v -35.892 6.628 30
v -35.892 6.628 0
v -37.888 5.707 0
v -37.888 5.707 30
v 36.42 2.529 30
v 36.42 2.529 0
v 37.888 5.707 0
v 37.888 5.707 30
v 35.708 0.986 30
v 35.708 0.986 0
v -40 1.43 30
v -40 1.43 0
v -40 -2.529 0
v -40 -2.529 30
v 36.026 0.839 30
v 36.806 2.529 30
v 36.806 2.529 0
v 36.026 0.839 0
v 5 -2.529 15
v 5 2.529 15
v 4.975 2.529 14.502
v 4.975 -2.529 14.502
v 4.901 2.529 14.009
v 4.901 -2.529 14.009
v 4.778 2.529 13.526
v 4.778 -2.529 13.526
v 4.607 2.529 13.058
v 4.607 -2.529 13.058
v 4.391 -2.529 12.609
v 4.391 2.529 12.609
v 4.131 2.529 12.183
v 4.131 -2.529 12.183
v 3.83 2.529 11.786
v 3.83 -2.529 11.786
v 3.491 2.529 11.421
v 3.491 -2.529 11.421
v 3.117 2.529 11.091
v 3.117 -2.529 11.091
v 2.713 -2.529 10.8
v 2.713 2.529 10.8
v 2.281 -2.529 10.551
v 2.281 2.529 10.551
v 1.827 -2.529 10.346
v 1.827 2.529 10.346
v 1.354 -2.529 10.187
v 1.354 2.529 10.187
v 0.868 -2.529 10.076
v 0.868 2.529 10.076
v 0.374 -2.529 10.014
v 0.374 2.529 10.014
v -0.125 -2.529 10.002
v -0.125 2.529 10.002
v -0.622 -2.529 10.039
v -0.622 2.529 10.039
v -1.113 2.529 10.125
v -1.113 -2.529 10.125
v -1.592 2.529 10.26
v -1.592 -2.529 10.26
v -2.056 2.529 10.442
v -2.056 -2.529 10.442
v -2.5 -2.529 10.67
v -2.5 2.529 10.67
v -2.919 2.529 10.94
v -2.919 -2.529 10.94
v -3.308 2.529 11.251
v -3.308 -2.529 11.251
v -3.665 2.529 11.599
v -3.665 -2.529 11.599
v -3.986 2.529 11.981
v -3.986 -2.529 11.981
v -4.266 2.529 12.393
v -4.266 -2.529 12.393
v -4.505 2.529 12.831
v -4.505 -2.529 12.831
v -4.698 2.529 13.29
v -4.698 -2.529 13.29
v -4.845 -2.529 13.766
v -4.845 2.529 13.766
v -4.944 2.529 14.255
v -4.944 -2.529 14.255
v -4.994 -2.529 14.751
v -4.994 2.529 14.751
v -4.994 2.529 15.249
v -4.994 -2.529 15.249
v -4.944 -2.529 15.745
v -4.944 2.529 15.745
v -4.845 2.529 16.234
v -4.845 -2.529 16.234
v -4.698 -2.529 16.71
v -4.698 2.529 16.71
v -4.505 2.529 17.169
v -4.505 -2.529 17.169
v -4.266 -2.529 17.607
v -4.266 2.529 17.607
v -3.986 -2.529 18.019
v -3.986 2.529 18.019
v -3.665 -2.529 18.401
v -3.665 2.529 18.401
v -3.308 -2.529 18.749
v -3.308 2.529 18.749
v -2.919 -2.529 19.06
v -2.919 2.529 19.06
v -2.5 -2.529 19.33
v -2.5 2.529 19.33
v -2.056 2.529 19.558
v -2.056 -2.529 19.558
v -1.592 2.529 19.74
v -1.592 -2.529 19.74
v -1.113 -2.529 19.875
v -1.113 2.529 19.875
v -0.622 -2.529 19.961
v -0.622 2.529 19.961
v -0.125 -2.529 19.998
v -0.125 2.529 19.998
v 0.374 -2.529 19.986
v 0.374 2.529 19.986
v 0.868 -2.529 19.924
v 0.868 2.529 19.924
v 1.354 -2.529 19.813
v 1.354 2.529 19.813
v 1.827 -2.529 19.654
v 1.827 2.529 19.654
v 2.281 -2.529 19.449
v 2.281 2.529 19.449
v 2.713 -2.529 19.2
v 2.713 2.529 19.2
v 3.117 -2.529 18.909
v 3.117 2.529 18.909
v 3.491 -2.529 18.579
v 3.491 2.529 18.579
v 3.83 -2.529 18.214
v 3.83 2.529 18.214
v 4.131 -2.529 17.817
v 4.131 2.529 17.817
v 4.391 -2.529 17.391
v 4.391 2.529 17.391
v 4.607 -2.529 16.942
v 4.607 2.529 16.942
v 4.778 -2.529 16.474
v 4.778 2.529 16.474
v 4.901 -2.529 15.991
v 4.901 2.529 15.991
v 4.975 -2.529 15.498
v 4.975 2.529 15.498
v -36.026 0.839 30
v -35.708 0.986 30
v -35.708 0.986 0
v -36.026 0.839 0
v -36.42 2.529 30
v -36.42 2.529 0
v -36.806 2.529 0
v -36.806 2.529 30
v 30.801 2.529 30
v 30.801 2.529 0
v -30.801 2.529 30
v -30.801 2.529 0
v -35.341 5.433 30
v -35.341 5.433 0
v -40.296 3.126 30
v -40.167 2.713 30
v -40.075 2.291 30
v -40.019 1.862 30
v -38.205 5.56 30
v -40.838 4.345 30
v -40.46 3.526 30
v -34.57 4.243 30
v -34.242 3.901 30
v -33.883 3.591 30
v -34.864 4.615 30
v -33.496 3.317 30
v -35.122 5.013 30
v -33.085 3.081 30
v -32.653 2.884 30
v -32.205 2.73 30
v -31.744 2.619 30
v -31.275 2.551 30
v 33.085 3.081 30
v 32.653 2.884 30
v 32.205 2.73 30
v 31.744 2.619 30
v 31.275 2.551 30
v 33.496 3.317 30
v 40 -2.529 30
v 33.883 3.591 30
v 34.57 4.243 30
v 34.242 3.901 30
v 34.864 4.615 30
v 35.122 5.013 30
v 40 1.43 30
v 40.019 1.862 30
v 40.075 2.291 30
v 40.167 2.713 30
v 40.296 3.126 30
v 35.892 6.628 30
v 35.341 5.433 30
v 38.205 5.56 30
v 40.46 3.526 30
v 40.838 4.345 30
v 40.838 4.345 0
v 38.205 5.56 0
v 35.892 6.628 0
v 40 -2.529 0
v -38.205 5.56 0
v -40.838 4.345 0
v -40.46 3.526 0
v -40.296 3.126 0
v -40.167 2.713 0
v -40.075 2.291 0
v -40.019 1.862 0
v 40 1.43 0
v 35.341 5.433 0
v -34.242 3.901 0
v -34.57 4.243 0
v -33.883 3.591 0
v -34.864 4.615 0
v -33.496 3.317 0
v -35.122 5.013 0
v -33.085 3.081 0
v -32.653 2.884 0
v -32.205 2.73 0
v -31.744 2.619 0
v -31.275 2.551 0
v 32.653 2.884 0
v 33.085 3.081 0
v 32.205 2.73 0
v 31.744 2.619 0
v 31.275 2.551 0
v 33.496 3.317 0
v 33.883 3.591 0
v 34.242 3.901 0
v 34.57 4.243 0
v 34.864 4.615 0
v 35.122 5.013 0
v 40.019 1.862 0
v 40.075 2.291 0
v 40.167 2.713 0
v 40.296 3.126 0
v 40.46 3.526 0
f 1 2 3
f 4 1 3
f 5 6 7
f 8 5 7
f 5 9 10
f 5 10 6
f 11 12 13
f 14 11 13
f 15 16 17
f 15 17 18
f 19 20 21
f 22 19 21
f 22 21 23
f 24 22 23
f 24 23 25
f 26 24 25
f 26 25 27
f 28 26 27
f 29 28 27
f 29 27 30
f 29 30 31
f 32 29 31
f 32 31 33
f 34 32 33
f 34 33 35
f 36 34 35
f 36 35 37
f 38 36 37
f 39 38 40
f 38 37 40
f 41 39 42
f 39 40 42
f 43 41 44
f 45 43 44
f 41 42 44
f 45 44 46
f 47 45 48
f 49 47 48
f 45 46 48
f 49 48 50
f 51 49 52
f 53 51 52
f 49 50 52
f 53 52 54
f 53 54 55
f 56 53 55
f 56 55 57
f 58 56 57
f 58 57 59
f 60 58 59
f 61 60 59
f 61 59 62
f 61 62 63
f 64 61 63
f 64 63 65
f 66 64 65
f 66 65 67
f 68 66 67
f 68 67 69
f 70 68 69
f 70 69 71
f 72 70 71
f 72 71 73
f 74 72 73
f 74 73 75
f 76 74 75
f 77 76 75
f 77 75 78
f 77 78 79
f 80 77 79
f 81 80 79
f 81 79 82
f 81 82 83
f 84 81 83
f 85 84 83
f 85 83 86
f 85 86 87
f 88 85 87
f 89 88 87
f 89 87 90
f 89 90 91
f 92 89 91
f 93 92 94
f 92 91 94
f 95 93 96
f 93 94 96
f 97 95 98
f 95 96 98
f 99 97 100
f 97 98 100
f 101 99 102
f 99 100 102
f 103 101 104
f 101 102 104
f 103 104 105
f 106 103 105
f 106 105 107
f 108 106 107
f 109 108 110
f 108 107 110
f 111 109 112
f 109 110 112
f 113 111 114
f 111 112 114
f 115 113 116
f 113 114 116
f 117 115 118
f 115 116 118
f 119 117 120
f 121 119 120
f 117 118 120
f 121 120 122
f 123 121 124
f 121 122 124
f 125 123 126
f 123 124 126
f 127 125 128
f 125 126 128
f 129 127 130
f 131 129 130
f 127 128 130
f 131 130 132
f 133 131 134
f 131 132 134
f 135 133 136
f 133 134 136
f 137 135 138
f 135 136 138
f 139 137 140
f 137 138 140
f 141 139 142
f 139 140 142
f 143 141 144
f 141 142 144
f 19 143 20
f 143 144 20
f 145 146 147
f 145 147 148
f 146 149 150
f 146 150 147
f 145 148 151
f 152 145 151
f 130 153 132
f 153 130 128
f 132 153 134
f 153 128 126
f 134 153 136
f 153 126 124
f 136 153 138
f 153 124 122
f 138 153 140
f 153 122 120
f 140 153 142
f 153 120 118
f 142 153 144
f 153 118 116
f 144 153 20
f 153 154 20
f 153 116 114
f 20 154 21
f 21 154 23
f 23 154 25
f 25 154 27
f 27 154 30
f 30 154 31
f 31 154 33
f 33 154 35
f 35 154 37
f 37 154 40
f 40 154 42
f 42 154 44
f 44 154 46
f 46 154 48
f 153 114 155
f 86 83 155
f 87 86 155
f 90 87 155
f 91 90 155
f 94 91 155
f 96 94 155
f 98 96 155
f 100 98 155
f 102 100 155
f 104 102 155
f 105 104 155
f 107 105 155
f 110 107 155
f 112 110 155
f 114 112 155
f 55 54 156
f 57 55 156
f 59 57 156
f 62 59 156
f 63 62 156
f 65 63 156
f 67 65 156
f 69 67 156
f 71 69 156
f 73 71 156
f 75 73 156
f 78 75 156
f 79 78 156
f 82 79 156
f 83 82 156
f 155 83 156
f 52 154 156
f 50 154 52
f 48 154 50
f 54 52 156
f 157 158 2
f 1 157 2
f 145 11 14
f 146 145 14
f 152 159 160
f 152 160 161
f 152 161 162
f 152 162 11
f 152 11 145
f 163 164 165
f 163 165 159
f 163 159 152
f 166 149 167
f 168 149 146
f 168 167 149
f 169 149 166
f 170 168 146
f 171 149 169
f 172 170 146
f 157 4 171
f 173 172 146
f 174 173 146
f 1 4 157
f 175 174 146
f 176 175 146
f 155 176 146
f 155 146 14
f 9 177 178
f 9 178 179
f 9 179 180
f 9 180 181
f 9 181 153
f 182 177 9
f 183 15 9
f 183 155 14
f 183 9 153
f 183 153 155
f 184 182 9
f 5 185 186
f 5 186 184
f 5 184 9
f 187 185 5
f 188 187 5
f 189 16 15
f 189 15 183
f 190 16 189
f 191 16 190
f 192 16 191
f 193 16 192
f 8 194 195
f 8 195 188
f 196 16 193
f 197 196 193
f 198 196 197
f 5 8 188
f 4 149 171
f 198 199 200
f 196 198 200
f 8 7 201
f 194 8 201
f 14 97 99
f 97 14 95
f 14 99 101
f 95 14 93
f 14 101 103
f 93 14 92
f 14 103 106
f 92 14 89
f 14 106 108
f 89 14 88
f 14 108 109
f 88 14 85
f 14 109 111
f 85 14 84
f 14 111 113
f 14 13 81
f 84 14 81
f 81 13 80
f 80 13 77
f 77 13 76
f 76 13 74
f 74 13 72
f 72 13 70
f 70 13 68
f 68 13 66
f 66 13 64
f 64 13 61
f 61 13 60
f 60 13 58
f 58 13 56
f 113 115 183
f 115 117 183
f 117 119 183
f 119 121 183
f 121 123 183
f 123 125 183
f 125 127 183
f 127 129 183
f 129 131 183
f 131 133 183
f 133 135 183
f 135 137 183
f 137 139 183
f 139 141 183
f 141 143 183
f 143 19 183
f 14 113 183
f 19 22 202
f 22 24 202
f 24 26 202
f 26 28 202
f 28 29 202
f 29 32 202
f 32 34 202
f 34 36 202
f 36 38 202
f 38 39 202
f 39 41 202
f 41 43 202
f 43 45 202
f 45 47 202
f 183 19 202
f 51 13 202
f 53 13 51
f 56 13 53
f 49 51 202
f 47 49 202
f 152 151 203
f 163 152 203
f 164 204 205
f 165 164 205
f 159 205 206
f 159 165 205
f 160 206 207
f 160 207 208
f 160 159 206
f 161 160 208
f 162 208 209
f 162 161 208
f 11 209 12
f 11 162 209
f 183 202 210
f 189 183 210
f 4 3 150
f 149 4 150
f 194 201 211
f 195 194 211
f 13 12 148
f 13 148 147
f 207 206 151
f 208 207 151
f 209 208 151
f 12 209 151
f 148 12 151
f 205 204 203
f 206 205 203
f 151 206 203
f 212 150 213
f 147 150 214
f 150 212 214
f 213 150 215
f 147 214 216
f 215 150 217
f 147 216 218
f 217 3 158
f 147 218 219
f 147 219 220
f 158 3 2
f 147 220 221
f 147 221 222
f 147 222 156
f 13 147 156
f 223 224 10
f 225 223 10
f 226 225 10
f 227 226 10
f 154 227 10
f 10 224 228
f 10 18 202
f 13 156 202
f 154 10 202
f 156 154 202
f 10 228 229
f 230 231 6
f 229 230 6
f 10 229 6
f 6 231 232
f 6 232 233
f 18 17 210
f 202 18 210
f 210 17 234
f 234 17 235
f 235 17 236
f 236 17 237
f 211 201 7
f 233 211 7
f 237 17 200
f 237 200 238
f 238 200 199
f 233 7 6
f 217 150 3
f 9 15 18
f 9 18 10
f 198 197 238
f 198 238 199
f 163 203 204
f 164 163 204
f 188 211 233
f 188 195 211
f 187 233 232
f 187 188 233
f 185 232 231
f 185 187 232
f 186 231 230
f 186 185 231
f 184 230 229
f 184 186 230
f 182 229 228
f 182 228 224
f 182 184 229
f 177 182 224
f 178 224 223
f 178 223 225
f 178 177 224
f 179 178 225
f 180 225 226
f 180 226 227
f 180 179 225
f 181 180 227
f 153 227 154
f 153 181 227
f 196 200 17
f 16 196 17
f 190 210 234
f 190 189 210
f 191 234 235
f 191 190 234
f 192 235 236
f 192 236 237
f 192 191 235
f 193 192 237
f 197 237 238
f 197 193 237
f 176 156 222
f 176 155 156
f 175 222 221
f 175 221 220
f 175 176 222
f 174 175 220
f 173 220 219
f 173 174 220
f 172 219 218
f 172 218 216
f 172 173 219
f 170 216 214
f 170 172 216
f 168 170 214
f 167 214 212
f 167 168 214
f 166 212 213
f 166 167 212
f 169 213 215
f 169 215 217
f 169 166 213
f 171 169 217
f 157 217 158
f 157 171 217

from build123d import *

# Parameters (mm, degrees)
BOSS_EXTRUDE1_DEPTH = 30
FILLET1_R           = 5
SKETCH2_R           = 5
CUT_EXTRUDE1_DEPTH  = 10


with BuildPart() as part:
    # Sketch1 → Boss-Extrude1 (new body)
    with BuildSketch(Plane.XY):
        Polygon((40, -2.528830443), (40, 2.528830443), (36.805899489, 2.528830443), (36.02578828, 0.838966186), (35.708014936, 0.9856635), (36.4204046, 2.528830443), (34, 2.528830443), (-34, 2.528830443), (-36.4204046, 2.528830443), (-35.708014936, 0.9856635), (-36.02578828, 0.838966186), (-36.805899489, 2.528830443), (-40, 2.528830443), (-40, -2.528830443), align=None)
        Polygon((-40.838270366, 4.344678122), (-40, 2.528830443), (-36.805899489, 2.528830443), (-38.205291231, 5.560170152), align=None)
        Polygon((-36.4204046, 2.528830443), (-34, 2.528830443), (-35.892316174, 6.627935069), (-37.887517887, 5.706867466), align=None)
        Polygon((34, 2.528830443), (36.4204046, 2.528830443), (37.887517887, 5.706867466), (35.892316174, 6.627935069), align=None)
        Polygon((36.805899489, 2.528830443), (40, 2.528830443), (40.838270366, 4.344678122), (38.205291231, 5.560170152), align=None)
    extrude(amount=BOSS_EXTRUDE1_DEPTH)

    # Fillet1
    fillet1_edges = [part.edges().sort_by_distance(p)[0] for p in [
        (34, 2.528830443, 15),
        (40, 2.528830443, 15),
        (-40, 2.528830443, 15),
        (-34, 2.528830443, 15),
    ]]
    fillet(fillet1_edges, radius=FILLET1_R)

    # Sketch2 → Cut-Extrude1 (cut)
    with BuildSketch(Plane(origin=(0, 2.528830443, 0), x_dir=(1, 0, 0), z_dir=(0, 1, 0))):
        with Locations((0, -15)):
            Circle(SKETCH2_R)
    extrude(amount=-CUT_EXTRUDE1_DEPTH, mode=Mode.SUBTRACT)


solid = part.part
